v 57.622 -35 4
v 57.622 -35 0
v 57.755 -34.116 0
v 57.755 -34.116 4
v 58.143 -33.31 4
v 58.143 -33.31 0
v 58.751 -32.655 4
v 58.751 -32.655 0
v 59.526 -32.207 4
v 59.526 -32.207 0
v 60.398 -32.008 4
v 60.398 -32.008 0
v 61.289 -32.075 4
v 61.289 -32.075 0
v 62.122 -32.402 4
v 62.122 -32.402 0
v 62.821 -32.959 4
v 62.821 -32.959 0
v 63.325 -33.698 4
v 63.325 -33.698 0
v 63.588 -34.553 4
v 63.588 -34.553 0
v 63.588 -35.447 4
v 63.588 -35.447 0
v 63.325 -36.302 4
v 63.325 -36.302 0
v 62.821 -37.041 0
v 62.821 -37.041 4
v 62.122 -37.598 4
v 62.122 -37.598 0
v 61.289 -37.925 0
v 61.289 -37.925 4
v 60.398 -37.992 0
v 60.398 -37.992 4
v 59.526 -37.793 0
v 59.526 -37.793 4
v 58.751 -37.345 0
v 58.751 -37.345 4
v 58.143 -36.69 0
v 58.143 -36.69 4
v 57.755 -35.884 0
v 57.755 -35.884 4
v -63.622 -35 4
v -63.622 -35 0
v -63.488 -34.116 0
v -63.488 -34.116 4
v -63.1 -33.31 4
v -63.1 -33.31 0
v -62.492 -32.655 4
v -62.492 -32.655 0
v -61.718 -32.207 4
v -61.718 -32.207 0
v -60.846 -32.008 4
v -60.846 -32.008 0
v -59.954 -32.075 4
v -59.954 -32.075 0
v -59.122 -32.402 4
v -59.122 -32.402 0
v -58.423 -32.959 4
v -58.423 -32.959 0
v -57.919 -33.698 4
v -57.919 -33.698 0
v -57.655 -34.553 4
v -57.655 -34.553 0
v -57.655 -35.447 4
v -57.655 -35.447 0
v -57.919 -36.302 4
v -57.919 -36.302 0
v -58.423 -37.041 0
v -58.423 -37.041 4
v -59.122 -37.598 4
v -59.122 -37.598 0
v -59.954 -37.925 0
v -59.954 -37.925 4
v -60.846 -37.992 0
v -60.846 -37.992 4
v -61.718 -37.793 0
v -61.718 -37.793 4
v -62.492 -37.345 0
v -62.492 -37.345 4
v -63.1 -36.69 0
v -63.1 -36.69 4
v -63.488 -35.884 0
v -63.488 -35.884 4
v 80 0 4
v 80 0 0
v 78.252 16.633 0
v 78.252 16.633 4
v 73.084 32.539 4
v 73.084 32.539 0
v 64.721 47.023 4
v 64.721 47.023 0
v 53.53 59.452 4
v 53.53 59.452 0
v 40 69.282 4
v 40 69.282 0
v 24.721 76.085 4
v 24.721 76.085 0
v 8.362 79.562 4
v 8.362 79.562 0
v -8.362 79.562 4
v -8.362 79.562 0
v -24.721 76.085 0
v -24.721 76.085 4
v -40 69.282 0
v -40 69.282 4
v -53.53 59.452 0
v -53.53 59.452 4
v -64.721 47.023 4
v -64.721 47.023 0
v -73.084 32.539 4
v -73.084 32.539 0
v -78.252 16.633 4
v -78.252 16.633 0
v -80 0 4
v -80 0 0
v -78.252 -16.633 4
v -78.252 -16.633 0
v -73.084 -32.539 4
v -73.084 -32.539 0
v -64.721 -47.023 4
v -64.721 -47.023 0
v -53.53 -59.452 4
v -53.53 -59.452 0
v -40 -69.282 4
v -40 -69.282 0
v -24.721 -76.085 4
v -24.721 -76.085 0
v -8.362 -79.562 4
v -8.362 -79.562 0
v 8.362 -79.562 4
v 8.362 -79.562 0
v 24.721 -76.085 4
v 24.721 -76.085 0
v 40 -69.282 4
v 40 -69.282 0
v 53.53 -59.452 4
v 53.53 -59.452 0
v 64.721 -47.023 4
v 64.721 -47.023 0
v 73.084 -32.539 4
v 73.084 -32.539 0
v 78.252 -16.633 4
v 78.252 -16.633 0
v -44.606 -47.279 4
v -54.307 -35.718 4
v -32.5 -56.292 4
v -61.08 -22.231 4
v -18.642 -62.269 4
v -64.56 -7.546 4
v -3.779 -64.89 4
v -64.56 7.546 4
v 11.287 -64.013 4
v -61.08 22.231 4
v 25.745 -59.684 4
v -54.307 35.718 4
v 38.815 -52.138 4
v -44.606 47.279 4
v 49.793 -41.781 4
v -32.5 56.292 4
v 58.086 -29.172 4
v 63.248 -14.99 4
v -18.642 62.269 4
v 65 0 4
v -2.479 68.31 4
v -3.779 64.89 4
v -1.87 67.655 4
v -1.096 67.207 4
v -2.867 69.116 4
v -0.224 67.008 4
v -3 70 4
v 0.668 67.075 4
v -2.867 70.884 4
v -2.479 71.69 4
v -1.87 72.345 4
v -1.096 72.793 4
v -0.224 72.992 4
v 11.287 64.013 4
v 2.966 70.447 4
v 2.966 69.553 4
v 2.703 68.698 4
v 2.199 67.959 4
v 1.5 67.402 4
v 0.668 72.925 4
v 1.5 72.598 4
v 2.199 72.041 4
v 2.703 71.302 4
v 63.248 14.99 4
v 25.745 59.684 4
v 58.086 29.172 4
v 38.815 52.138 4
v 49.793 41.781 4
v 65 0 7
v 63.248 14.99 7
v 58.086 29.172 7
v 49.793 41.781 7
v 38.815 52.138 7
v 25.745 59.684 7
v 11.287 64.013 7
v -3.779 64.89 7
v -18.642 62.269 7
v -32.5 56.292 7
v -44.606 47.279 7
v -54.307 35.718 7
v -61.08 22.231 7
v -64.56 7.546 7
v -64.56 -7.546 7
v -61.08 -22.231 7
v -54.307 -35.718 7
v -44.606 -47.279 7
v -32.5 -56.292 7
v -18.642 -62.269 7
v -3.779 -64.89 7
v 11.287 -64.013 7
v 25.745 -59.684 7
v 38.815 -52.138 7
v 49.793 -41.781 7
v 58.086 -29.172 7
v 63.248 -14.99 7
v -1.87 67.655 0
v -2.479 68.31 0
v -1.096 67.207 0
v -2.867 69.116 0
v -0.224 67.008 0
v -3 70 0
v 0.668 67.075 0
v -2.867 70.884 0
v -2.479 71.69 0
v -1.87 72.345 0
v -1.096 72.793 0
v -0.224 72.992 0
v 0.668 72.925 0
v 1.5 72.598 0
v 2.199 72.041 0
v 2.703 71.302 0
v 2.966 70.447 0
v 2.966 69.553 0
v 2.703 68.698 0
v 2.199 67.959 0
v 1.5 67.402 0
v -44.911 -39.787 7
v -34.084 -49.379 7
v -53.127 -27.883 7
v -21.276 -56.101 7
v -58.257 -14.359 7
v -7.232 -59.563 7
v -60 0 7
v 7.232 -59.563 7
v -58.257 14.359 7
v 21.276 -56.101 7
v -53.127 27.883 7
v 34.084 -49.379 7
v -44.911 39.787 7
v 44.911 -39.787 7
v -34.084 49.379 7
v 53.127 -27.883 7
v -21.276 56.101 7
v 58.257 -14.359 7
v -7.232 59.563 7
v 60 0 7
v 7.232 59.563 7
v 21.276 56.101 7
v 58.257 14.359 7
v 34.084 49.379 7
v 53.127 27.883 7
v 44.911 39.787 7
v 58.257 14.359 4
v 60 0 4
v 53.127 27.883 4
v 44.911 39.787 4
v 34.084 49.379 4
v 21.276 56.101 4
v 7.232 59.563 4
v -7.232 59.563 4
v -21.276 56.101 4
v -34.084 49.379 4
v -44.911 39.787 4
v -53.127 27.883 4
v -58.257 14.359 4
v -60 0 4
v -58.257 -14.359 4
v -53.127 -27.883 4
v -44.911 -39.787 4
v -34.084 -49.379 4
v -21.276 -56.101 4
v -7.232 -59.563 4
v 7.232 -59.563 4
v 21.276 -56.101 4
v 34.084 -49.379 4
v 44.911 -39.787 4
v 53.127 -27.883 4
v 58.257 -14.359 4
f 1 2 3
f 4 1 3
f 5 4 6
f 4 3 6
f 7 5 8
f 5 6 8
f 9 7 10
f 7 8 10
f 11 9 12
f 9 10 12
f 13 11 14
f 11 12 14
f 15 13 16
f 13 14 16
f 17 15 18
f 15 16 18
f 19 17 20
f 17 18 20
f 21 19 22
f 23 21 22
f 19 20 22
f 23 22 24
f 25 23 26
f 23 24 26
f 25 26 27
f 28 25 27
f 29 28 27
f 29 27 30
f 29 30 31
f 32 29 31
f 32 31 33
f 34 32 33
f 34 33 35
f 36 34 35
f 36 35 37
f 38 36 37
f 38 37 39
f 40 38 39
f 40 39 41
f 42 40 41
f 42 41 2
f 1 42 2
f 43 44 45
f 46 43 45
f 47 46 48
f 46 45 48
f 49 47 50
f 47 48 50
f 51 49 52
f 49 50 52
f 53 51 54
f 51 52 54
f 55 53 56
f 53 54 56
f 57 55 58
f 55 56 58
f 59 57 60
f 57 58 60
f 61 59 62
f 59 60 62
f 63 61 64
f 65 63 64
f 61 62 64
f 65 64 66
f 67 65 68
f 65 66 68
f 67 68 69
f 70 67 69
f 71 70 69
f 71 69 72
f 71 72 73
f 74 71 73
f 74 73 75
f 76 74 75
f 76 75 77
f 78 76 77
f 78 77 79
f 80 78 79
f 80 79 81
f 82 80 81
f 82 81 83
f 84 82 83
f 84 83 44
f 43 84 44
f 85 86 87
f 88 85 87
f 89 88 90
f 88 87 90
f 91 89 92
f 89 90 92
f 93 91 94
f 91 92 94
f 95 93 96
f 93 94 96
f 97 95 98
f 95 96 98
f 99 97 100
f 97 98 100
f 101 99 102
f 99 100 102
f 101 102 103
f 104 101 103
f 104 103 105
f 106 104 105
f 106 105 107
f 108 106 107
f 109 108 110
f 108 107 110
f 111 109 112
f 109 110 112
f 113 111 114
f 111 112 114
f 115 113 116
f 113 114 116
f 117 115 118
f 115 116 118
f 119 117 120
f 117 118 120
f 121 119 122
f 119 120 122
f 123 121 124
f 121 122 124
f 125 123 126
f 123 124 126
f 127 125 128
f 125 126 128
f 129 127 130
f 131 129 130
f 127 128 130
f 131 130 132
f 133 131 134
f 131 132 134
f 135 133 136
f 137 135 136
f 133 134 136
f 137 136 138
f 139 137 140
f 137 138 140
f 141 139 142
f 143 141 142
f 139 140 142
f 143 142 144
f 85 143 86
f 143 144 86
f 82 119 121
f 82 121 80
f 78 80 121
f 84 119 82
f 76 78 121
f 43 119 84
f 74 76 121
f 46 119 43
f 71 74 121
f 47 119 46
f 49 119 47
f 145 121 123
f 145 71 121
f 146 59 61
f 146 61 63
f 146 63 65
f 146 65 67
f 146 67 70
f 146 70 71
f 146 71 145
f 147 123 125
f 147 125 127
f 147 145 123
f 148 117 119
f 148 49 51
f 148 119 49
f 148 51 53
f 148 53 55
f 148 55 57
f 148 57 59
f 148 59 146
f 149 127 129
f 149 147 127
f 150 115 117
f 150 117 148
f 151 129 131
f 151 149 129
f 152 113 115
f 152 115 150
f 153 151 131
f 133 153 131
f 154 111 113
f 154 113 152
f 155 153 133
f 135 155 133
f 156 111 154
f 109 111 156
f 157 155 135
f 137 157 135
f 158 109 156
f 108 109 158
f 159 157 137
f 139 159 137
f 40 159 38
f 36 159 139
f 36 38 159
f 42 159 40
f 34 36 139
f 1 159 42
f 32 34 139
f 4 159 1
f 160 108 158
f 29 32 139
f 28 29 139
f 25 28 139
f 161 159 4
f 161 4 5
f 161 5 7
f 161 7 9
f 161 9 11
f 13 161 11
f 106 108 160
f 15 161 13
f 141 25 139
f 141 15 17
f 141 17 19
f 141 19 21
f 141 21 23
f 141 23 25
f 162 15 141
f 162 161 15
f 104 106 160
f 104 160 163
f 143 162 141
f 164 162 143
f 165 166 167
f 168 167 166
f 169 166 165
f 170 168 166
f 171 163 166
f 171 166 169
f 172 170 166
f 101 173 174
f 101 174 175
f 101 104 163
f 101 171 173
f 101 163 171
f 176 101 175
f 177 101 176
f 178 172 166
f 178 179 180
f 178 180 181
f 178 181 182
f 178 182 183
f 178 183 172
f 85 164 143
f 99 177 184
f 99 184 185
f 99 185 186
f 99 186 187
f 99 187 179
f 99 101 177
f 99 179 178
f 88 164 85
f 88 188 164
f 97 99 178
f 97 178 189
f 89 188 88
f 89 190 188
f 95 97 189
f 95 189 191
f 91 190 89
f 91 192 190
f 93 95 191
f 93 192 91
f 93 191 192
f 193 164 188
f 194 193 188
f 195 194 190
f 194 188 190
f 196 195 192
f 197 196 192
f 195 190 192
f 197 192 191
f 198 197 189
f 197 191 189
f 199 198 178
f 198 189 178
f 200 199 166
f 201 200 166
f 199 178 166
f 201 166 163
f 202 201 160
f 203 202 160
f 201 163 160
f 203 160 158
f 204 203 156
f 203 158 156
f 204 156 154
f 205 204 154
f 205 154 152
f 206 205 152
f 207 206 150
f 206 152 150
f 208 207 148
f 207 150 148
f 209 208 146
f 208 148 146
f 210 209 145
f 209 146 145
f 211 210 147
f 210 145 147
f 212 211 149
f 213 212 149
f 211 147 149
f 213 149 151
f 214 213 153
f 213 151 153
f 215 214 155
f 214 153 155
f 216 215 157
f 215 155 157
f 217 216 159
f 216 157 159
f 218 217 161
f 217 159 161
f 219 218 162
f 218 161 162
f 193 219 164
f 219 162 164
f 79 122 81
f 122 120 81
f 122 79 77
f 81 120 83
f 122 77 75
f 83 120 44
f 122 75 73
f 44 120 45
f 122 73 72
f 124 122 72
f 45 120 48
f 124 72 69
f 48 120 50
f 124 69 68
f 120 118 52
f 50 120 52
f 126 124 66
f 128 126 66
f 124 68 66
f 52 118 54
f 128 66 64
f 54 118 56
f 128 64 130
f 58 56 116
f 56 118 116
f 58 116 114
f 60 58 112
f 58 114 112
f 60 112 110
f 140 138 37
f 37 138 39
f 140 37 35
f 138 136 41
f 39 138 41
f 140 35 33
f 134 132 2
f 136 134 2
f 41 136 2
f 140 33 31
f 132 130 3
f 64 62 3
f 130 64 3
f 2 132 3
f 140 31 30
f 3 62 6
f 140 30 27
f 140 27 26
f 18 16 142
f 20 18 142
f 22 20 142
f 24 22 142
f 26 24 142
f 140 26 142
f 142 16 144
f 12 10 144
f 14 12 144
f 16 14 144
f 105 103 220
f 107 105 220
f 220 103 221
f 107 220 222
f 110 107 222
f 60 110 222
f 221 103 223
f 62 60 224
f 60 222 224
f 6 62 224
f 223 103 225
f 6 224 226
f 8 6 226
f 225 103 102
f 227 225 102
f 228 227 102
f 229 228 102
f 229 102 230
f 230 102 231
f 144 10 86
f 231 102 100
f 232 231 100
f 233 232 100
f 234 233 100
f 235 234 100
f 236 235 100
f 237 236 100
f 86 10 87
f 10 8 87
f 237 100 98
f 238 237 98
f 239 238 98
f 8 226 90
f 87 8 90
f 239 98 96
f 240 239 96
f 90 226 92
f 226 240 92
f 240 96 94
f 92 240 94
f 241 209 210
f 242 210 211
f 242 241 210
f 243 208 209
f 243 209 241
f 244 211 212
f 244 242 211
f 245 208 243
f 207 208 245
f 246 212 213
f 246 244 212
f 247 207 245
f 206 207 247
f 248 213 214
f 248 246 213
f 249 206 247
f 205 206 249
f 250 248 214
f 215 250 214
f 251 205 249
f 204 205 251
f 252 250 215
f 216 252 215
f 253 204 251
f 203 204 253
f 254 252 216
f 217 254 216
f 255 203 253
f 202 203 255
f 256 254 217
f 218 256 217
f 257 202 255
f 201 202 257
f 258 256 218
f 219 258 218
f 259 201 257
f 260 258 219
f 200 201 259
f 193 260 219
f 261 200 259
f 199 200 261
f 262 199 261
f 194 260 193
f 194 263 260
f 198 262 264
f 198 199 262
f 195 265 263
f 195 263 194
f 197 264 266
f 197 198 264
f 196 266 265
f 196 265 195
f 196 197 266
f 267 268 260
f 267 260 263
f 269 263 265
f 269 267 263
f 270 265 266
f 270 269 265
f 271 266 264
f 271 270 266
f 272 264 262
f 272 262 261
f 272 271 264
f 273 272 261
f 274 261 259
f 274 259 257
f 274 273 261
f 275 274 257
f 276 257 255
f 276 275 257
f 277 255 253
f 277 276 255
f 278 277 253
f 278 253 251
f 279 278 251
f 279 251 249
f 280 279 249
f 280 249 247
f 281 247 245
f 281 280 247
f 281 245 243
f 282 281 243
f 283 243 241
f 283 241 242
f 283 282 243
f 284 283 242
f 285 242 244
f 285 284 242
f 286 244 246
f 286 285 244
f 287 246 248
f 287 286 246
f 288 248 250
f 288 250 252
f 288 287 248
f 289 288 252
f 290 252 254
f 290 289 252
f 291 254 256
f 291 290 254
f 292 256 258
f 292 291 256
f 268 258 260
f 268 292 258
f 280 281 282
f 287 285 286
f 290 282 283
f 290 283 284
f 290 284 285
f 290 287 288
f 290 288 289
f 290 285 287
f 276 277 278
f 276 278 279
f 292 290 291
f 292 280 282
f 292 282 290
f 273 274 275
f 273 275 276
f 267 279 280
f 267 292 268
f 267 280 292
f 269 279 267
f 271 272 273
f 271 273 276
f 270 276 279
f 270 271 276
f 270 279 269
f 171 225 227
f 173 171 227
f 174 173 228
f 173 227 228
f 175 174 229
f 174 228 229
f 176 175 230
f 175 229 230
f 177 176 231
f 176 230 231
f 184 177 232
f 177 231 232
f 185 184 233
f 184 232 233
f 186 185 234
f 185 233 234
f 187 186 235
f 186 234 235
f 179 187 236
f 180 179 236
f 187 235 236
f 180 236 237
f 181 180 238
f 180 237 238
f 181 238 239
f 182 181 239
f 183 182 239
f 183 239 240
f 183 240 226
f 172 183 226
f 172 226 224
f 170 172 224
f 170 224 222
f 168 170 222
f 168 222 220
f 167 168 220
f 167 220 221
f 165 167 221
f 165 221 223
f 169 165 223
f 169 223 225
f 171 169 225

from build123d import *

# Parameters (mm, degrees)
SKETCH1_R           = 80
BOSS_EXTRUDE1_DEPTH = 4
SKETCH2_R           = 65
SKETCH2_R_2         = 60
BOSS_EXTRUDE2_DEPTH = 3
SKETCH3_R           = 3
CUT_EXTRUDE2_DEPTH  = 8


with BuildPart() as part:
    # Sketch1 → Boss-Extrude1 (new body)
    with BuildSketch(Plane.XY):
        Circle(SKETCH1_R)
    extrude(amount=BOSS_EXTRUDE1_DEPTH)

    # Sketch2 → Boss-Extrude2 (add)
    with BuildSketch(Plane.XY.offset(4)):
        Circle(SKETCH2_R)
        Circle(SKETCH2_R_2, mode=Mode.SUBTRACT)
    extrude(amount=BOSS_EXTRUDE2_DEPTH)

    # Sketch3 → Cut-Extrude2 (cut, through all)
    with BuildSketch(Plane(origin=(0, 0, 0), x_dir=(-1, 0, 0), z_dir=(0, 0, -1))):
        with Locations((0, 70)):
            Circle(SKETCH3_R)
        with Locations((60.621778265, -35)):
            Circle(SKETCH3_R)
        with Locations((-60.621778265, -35)):
            Circle(SKETCH3_R)
    extrude(amount=-CUT_EXTRUDE2_DEPTH, mode=Mode.SUBTRACT)


solid = part.part
